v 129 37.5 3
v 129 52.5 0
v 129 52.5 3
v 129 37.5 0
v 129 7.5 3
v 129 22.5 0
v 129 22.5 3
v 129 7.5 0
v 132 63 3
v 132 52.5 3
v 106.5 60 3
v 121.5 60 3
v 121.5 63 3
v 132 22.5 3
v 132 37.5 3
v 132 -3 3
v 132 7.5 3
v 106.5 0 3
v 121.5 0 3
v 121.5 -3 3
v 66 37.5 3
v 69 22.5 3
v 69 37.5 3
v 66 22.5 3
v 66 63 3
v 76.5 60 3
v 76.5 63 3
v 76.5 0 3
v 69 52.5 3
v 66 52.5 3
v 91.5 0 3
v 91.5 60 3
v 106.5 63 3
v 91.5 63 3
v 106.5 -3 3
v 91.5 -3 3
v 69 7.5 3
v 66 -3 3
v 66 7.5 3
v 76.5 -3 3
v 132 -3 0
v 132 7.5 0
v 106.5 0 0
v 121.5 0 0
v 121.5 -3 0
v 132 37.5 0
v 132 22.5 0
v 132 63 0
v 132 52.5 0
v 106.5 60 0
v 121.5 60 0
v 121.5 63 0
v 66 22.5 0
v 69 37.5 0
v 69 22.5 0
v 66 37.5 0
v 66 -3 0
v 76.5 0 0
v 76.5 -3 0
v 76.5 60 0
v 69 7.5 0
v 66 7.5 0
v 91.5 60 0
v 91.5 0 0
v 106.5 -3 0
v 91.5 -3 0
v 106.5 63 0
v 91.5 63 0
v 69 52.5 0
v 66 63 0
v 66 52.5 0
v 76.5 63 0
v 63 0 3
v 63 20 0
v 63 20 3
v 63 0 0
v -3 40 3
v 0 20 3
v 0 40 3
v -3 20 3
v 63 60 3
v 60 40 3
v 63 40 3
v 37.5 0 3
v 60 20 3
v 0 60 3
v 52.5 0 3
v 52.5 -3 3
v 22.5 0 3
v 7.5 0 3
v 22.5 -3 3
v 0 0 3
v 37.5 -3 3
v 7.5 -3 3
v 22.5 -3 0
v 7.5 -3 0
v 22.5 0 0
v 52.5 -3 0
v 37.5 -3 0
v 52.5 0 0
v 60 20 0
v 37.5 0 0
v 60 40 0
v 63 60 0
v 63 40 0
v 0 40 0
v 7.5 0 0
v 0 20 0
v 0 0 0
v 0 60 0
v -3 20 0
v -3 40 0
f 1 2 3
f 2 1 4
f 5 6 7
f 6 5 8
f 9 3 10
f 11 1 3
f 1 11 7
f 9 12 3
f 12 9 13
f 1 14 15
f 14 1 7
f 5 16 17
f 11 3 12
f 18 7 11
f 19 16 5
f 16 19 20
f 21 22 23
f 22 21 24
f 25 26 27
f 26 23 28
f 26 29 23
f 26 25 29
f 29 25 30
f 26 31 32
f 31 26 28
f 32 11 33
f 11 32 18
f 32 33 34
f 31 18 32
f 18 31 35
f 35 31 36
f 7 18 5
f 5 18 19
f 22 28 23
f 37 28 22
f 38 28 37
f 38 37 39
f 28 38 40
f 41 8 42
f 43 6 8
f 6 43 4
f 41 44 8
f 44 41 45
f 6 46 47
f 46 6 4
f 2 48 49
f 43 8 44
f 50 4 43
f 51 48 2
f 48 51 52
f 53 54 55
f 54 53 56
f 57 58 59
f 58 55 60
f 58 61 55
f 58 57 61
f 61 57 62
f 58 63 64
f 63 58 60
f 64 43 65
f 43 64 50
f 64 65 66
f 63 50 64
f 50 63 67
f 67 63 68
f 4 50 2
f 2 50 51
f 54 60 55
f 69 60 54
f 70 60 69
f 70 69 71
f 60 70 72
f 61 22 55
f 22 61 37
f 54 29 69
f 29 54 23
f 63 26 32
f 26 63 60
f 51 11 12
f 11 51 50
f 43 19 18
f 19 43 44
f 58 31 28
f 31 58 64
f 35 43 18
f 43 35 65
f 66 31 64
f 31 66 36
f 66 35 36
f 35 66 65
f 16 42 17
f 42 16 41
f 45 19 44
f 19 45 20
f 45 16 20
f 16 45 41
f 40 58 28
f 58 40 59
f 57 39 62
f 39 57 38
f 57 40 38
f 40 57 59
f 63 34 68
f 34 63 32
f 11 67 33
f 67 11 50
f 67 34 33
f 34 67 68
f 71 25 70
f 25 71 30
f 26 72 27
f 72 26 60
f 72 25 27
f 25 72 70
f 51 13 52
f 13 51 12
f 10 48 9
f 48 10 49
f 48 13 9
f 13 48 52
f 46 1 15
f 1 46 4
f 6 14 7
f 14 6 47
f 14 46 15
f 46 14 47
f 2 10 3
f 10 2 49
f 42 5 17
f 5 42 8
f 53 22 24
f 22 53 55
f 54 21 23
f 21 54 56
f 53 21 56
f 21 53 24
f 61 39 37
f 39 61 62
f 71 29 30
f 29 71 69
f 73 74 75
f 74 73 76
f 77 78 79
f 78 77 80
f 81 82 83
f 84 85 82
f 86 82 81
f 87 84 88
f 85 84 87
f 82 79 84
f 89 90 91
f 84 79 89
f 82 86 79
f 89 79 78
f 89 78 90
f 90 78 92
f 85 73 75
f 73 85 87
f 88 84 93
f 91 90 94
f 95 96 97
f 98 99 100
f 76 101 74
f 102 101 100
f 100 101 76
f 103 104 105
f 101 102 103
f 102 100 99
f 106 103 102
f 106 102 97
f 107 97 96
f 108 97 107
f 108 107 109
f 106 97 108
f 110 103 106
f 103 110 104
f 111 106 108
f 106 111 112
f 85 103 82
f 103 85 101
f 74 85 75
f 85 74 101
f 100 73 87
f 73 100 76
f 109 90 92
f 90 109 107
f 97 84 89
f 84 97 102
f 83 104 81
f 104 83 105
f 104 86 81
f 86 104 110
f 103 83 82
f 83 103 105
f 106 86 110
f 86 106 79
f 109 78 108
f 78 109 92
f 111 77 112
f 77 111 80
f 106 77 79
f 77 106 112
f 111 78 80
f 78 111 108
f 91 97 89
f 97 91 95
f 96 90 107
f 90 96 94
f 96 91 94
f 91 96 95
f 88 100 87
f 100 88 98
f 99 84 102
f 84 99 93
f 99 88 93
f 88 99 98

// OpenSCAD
width = 60;
height = 60;
th = 3;


module sida()
{
scale(1)
{
  cube([width,height,th]);

  //tvasaker
  union()
  {
    translate([width,0,0])
    cube([th,width/3,th]);
    translate([width, 2*height/3,0])
    cube([th,height/3,th]);
  }
  //ensak
  translate([-th, height/3,0])
  cube([th,height/3,th]);


  //nedatsaker
  translate([width/4-width/8, -th,0])
  cube([width/4,th,th]);

  translate([3*width/4-width/8, -th,0])
  cube([width/4,th,th]);
  
  
 } 
}

module bottendel()
{
  cube([width,height,th]);
  translate([2*width/4-width/8, -th,0])
  cube([width/4,th,th]);
 

  translate([4*width/4-width/8, -th,0])
  cube([width/8+th,th,th]);

  translate([-th, -th, 0])
  cube([width/8+th,th,th]);
 
 
  
}


module botten()
{
scale(1)
{
union()
{
translate([0,0,0])
bottendel();

translate([width,height,0])
rotate([0,0,180])
bottendel();

translate([width,0,0])
rotate([0,0,90])
bottendel();

translate([0,height,0])
rotate([0,0,-90])
bottendel();
}
}
}
translate([width+th*3,0,0])
botten();

sida();



//alla sidor!
/*
rotate([90,0,0])
{
sida();
translate([width+.1,0,0])
rotate([0,90,0])
sida();

translate([width+.1,0,-width-.2])
rotate([0,180,0])
sida();


translate([0,0,-width-.2])
rotate([0,-90,0])
sida();

}
*/
